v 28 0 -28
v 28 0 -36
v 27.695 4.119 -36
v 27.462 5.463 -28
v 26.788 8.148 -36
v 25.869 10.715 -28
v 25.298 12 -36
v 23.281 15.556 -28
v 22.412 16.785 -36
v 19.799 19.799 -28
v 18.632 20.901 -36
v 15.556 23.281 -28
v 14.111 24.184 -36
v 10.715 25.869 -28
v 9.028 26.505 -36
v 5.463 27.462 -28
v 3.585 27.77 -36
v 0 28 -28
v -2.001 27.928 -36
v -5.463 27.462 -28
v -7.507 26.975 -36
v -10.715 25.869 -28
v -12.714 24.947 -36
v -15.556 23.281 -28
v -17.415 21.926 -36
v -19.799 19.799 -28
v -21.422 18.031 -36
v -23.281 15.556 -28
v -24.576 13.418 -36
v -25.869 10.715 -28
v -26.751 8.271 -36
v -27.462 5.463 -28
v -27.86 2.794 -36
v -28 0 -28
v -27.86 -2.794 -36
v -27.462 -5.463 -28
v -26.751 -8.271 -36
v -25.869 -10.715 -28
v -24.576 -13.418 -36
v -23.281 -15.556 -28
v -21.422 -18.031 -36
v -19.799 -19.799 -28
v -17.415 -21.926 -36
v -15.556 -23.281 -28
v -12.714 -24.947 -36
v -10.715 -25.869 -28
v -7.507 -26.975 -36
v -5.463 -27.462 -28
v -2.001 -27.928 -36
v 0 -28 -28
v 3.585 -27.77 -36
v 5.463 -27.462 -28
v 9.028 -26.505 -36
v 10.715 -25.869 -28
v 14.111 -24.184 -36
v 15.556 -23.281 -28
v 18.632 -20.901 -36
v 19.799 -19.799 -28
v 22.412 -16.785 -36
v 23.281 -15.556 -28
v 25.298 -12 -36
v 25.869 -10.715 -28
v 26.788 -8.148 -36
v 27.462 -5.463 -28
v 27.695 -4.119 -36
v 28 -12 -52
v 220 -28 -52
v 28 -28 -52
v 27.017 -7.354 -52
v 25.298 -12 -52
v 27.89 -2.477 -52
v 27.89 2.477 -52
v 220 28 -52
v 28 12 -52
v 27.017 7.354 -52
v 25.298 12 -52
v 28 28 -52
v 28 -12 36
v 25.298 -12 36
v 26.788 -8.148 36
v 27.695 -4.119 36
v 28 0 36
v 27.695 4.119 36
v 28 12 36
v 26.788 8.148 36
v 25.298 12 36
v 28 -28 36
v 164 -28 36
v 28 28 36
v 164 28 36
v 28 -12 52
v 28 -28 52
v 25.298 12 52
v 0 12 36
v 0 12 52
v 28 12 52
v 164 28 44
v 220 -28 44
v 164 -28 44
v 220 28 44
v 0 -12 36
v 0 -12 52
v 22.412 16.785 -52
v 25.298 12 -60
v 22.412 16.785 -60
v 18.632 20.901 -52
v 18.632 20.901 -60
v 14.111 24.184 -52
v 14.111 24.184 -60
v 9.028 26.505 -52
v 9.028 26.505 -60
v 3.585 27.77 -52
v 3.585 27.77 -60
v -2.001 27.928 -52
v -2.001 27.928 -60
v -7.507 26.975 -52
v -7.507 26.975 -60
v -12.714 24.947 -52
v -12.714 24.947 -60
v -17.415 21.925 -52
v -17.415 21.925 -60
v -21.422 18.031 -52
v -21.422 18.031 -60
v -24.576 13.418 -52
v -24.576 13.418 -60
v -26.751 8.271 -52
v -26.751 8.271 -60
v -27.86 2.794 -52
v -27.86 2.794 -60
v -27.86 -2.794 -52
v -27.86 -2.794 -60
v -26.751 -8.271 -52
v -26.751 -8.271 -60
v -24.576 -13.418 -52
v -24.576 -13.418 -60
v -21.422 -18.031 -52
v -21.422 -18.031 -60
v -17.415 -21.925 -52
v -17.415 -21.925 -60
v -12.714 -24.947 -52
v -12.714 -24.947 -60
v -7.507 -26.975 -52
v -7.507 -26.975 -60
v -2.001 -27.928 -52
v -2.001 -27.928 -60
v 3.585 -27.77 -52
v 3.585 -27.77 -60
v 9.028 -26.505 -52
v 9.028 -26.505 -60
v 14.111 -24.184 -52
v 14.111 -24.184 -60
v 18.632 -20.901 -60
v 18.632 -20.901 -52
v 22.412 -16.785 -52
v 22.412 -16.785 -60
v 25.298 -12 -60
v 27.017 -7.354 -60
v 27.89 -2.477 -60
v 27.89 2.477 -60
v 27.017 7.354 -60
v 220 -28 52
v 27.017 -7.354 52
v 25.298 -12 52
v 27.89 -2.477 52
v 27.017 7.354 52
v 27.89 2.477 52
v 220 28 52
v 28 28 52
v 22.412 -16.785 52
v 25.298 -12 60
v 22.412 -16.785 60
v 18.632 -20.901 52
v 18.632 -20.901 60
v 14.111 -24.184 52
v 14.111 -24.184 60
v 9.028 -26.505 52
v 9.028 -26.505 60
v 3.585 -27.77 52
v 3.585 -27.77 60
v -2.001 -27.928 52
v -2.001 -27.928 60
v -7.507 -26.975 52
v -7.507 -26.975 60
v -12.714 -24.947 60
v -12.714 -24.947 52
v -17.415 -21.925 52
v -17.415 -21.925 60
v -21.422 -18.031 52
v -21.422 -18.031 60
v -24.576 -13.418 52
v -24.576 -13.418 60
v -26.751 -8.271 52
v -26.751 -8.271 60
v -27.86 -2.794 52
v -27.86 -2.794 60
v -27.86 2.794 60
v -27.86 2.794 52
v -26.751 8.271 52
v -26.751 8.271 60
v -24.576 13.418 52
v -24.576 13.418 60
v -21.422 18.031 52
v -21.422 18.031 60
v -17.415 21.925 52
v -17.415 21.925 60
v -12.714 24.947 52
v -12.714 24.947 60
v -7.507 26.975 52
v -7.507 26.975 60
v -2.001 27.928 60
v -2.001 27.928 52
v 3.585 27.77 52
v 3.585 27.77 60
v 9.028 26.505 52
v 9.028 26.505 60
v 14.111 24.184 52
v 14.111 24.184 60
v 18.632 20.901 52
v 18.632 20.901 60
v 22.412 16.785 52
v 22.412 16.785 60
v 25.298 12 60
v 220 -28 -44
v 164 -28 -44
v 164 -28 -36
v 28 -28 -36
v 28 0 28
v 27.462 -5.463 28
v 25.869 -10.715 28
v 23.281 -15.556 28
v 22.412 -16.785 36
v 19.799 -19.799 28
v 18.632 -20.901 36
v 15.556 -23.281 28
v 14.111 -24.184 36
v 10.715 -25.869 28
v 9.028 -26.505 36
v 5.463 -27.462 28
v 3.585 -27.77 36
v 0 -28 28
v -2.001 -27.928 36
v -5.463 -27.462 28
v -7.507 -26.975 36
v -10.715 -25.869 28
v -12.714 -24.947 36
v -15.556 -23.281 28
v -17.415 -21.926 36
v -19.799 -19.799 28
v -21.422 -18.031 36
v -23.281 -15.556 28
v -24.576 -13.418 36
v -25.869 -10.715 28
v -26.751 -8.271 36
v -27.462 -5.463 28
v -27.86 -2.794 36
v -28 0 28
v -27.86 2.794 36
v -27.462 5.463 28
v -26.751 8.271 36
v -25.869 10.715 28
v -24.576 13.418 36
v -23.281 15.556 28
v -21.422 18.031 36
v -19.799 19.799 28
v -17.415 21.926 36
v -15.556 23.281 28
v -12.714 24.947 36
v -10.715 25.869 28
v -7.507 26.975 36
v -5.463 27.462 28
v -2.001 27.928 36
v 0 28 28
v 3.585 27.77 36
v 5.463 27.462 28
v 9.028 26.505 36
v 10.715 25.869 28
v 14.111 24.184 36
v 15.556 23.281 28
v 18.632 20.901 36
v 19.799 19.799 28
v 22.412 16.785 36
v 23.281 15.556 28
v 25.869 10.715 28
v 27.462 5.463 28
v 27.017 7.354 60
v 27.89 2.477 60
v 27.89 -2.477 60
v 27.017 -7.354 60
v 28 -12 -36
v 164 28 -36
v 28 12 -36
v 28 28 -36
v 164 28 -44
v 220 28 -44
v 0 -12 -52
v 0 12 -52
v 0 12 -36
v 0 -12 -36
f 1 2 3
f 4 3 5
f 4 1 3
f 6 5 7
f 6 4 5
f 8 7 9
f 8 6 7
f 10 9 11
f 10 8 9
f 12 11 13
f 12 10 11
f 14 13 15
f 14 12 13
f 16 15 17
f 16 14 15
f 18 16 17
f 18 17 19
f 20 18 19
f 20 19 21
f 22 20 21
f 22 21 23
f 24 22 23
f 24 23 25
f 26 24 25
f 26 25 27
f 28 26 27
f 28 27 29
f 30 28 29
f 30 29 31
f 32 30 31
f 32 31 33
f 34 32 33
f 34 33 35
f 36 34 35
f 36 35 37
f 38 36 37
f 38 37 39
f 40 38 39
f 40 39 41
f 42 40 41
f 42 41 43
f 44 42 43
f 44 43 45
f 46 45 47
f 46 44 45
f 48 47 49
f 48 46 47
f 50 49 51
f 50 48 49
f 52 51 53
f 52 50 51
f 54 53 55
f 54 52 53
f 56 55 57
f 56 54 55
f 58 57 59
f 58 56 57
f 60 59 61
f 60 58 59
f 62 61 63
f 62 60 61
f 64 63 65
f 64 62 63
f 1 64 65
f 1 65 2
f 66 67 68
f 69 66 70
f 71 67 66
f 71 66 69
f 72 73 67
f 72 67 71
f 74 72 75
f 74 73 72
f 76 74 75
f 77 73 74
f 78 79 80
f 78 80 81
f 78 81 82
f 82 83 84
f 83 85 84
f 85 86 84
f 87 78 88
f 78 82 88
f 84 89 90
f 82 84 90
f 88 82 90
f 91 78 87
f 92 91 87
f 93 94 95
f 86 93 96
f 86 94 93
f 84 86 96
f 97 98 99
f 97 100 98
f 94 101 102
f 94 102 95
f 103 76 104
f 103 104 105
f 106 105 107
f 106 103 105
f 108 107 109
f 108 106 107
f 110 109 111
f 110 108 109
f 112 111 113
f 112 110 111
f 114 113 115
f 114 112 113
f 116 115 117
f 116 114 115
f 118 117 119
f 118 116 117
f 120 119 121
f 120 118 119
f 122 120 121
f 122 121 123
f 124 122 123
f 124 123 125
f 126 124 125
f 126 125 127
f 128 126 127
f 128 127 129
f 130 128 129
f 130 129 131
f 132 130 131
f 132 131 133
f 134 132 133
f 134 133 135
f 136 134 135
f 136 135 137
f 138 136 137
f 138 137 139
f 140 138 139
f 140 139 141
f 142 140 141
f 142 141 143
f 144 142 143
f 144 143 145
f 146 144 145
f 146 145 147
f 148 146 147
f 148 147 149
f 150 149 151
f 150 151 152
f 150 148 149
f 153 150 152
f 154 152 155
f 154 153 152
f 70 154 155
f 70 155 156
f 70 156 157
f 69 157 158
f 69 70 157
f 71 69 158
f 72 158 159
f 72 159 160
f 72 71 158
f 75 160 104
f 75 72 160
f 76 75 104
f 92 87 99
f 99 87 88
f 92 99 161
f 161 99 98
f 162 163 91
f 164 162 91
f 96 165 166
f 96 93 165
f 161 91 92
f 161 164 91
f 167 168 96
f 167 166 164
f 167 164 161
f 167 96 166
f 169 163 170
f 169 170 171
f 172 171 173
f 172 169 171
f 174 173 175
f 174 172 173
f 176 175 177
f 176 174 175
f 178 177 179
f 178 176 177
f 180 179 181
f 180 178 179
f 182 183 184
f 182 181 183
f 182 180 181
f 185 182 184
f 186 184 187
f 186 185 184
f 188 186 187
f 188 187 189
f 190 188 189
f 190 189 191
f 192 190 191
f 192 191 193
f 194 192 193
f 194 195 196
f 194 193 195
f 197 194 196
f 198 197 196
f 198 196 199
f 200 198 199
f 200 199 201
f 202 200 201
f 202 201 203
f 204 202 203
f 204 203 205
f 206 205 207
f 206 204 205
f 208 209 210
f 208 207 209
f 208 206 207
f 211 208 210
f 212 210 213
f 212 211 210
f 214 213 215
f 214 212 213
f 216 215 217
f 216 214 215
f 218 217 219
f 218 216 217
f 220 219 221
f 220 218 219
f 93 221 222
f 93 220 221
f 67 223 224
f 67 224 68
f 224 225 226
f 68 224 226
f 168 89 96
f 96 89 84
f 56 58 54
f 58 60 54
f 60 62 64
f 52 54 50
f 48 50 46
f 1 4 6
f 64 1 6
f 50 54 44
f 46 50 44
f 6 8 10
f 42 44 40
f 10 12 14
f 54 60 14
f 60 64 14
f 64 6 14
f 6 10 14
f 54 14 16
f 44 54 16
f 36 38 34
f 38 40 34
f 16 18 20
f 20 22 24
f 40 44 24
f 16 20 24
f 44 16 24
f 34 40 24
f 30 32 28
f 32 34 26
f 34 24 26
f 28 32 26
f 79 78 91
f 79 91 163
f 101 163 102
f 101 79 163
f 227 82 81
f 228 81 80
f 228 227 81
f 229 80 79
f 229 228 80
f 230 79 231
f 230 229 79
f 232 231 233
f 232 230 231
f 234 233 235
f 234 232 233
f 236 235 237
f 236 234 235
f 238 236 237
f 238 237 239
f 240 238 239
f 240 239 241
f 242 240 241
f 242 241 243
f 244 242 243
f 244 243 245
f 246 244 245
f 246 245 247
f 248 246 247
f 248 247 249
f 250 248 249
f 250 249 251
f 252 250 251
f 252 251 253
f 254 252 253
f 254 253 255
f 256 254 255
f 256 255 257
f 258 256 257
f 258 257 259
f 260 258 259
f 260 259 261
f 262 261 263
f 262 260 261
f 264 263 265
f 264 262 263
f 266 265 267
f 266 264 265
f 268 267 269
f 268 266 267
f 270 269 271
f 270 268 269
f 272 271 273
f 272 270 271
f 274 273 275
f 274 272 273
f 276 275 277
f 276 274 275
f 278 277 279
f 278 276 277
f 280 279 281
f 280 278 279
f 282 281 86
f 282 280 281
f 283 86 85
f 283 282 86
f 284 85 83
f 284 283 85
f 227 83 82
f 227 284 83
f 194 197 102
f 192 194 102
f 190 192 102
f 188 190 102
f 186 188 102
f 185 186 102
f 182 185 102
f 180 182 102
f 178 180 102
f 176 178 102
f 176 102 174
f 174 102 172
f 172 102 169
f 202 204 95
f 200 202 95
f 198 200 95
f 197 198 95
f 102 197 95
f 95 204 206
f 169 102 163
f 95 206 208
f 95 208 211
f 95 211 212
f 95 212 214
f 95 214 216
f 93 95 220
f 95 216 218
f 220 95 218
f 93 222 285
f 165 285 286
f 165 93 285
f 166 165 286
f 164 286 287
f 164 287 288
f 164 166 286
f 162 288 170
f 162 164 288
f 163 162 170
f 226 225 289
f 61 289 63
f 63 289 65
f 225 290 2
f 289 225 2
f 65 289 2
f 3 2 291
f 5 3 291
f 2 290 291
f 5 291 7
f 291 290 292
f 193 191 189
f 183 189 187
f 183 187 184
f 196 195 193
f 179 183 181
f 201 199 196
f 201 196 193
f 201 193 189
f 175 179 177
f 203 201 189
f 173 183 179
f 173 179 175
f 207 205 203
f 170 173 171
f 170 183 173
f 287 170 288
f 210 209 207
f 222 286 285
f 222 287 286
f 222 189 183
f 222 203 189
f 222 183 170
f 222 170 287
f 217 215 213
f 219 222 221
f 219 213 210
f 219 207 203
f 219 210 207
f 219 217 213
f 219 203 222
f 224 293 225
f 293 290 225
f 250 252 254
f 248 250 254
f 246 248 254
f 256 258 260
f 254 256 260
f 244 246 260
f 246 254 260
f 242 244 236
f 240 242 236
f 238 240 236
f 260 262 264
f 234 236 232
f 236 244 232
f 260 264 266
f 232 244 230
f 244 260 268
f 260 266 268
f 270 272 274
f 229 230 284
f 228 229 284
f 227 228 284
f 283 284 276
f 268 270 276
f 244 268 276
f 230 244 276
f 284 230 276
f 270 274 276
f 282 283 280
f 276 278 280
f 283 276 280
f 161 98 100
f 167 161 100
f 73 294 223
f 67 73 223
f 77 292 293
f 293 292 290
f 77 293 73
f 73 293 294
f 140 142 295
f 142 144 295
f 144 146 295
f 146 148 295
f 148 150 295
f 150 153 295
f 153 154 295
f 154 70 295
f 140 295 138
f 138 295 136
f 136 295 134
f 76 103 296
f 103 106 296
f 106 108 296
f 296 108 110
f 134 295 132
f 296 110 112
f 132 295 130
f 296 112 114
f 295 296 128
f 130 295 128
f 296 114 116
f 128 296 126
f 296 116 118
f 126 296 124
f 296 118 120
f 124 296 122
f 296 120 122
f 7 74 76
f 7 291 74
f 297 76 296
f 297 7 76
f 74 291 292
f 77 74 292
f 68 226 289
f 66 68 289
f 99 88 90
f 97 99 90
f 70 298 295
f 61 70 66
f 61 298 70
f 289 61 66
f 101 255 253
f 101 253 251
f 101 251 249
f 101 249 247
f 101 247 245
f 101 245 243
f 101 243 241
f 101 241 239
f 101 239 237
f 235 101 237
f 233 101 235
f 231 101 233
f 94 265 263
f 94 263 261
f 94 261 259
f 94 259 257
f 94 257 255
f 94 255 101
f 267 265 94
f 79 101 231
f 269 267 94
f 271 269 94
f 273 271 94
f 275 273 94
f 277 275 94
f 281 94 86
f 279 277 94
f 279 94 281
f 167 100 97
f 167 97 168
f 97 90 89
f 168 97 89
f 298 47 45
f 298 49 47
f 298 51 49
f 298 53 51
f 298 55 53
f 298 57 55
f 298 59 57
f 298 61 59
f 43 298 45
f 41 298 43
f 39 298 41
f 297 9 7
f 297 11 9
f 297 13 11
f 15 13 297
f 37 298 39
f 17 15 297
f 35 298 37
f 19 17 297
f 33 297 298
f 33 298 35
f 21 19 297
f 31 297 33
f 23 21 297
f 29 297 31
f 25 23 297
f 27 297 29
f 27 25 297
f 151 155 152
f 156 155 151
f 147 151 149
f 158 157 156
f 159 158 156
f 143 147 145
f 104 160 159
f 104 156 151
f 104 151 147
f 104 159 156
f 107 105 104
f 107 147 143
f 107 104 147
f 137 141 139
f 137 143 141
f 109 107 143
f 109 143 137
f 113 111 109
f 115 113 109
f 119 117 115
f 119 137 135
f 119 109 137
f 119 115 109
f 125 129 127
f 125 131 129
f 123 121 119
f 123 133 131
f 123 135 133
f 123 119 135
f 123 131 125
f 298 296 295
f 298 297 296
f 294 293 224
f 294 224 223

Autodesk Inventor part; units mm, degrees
ref_plane "YZ Plane" through (0, 0, 0) normal (1, 0, 0) x (0, 1, 0)
ref_plane "Work Plane1" through (0, 0, 28) normal (0, 0, 1) x (1, 0, 0)
sketch "Sketch2" plane through (0, 0, 28) normal (0, 0, 1) x (1, 0, 0)
  circle A0 centre (0, 0) radius 28
  dimension "d2" = 56
extrude "Extrusion1" add sketch "Sketch2" along normal blind 8
sketch "Sketch3" plane through (0, 0, 36) normal (0, 0, 1) x (1, 0, 0)
  line L0 (28, -12) -> (0, -12)
  line L1 (0, -12) -> (0, 12)
  line L2 (0, 12) -> (28, 12)
  line L3 (28, 12) -> (28, -12)
  line L4 (28, -12) -> (0, 12) construction
  line L5 (0, -12) -> (28, 12) construction
  line L6 (-77.6, 0) -> (269.6, 0) projected
  line L7 (28, -28) -> (220, -28)
  line L8 (220, -28) -> (220, 28)
  line L9 (220, 28) -> (28, 28)
  line L10 (28, 28) -> (28, -28)
  line L11 (28, -28) -> (220, 28) construction
  line L12 (220, -28) -> (28, 28) construction
  point P0 (0, 0)
  point P1 (14, 0)
  point P2 (124, 0)
  dimension "d5" = 24
  dimension "d6" = 28
  dimension "d7" = 192
  dimension "d8" = 56
extrude "Extrusion2" add sketch "Sketch3" along normal blind 16
sketch "Sketch4" plane through (0, 0, 52) normal (0, 0, 1) x (1, 0, 0)
  circle A0 centre (0, 0) radius 28
  arc A1 (25.2982, 12) -> (25.2982, -12) centre (0, 0) ccw projected
extrude "Extrusion3" add sketch "Sketch4" along normal blind 8
sketch "Sketch5" plane through (0, 0, 36) normal (0, 0, -1) x (-1, 0, 0)
  line L0 (-28, -28) -> (-220, -28) projected
  line L1 (-220, 28) -> (-28, 28) projected
  line L2 (-220, -28) -> (-164, -28)
  line L3 (-164, -28) -> (-164, 28)
  line L4 (-164, 28) -> (-220, 28)
  line L5 (-220, 28) -> (-220, -28)
  line L6 (77.6, 0) -> (-269.6, 0) projected
  point P0 (0, 0)
  point P1 (-208, 0)
  dimension "d13" = 56
  dimension "d16" = 12
extrude "Extrusion4" cut sketch "Sketch5" against normal blind 8
mirror "Mirror2" about plane through (0, 0, 0) normal (0, 0, 1) of "Extrusion1", "Extrusion2", "Extrusion3", "Extrusion4"
ref_plane "Work Plane3" through (0, 28, 0) normal (0, 1, 0) x (-1, 0, 0)
ref_plane "UCS2: YZ Plane" through (0, 0, 0) normal (1, 0, 0) x (0, 1, 0)
ref_plane "UCS2: XZ Plane" through (0, 0, 0) normal (0, 1, 0) x (0, 0, 1)
ref_plane "UCS2: XY Plane" through (0, 0, 0) normal (0, 0, 1) x (1, 0, 0)
properties part number "link_2"
